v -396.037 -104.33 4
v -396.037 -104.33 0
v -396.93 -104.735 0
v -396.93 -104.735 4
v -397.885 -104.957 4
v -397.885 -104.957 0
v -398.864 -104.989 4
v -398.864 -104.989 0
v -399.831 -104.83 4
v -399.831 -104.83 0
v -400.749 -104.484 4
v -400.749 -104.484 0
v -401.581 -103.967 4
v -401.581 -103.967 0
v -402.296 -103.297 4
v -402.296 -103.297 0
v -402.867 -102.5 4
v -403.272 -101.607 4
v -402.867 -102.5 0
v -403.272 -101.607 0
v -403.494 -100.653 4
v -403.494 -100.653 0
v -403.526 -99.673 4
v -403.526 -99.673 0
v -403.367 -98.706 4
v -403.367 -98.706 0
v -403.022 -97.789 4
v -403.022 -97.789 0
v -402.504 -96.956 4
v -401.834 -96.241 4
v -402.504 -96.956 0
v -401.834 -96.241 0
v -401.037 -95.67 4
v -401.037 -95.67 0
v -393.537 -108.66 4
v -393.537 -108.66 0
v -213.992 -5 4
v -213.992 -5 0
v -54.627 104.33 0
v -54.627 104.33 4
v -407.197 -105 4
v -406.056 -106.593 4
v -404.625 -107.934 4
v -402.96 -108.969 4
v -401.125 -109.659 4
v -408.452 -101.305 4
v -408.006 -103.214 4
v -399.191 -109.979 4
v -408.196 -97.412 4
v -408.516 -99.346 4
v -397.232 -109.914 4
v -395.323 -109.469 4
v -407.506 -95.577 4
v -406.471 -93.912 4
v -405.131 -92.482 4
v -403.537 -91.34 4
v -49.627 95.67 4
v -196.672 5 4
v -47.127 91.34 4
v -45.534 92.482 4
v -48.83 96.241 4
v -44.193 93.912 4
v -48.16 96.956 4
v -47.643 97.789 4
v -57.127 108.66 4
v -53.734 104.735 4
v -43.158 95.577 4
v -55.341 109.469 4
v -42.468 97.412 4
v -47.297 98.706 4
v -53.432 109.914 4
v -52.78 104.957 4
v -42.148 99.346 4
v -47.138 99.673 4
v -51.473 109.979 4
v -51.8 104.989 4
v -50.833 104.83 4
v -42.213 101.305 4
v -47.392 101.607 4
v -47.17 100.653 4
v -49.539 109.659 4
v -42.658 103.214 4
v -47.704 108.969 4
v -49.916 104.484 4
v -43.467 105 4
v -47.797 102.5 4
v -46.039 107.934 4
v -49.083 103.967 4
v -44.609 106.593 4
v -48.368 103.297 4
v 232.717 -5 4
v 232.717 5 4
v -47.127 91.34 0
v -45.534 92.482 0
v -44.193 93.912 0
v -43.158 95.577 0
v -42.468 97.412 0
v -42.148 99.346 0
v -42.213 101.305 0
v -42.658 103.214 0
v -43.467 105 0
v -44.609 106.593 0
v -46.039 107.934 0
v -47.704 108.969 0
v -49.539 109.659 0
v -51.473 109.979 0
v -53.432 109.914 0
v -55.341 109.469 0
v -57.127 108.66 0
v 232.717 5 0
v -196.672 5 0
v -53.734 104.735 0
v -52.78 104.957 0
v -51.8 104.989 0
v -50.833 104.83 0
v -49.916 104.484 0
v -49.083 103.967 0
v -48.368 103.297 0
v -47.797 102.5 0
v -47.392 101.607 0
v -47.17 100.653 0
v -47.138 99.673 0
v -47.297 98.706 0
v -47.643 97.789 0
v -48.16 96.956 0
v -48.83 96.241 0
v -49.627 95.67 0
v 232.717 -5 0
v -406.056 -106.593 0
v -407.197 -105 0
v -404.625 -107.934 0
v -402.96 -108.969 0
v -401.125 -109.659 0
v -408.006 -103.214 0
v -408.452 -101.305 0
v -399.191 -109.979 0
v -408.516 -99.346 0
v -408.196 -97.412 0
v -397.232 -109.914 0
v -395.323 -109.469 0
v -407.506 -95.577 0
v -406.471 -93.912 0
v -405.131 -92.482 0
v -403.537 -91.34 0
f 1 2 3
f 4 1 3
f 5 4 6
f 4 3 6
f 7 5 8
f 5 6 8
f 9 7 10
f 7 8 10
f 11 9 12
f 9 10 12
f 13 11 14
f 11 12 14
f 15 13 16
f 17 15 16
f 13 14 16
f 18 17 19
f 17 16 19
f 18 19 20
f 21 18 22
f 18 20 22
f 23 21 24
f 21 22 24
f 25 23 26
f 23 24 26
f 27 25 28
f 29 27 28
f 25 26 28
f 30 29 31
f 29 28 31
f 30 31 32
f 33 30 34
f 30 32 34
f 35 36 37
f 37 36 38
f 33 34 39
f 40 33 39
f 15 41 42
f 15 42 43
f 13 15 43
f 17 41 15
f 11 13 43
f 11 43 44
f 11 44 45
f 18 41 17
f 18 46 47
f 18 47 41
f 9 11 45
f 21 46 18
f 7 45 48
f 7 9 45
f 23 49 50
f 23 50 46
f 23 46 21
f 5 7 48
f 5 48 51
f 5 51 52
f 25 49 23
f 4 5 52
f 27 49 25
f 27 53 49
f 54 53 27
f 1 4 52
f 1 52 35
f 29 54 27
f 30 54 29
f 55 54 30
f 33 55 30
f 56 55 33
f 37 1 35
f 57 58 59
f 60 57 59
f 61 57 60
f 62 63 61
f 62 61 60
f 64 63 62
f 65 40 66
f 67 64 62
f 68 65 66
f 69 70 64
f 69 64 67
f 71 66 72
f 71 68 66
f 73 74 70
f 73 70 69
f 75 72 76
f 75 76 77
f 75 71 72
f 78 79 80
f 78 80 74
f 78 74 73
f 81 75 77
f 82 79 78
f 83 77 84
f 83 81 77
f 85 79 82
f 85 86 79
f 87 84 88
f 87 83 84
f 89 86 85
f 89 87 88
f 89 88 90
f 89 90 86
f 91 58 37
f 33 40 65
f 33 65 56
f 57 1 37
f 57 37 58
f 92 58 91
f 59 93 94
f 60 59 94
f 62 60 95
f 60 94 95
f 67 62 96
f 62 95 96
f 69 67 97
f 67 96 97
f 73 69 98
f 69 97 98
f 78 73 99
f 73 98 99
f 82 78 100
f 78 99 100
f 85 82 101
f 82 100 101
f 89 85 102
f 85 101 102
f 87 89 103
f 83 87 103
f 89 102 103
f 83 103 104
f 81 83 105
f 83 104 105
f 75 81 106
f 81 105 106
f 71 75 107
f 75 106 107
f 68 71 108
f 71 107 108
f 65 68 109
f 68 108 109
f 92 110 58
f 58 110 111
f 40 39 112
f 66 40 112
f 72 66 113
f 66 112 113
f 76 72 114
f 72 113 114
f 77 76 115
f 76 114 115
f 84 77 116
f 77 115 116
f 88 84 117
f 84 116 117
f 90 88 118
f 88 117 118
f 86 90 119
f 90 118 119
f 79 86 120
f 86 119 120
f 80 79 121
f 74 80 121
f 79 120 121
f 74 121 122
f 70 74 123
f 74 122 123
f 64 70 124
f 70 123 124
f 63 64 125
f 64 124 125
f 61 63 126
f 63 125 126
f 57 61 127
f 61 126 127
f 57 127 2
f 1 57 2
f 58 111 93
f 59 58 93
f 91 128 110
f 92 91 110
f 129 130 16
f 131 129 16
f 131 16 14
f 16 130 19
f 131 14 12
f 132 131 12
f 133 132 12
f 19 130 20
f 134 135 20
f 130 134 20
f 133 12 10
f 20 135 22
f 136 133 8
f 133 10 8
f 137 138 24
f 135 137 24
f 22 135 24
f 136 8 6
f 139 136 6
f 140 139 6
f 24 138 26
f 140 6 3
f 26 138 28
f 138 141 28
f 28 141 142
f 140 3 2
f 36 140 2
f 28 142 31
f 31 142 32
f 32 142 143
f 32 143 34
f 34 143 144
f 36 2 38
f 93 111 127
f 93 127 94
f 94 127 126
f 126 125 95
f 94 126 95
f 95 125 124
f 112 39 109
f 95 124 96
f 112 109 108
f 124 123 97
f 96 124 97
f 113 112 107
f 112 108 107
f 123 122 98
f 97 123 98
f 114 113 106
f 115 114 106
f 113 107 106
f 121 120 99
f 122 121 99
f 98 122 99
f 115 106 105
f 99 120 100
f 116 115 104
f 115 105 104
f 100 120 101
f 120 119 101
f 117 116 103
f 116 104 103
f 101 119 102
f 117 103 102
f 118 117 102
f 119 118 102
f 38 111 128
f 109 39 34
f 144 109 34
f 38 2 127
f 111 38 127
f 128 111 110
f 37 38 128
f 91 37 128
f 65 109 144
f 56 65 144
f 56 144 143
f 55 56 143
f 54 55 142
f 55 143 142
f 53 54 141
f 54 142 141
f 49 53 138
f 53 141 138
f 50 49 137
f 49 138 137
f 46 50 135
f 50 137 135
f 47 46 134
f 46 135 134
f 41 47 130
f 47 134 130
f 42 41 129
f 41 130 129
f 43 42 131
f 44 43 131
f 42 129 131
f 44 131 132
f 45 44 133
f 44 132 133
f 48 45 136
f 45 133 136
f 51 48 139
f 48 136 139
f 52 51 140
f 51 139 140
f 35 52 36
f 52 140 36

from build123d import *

# Parameters (mm, degrees)
EXTRUDE_1_DEPTH = 4


with BuildPart() as part:
    # 草图1 → 凸台-拉伸1 (new body)
    with BuildSketch(Plane.XY):
        with BuildLine():
            Line((-196.671823256, 5), (-47.126996537, 91.339745962))
            ThreePointArc((-47.126996537, 91.339745962), (-43.466742499, 105), (-57.126996537, 108.660254038))
            Line((-57.126996537, 108.660254038), (-403.537158051, -91.339745962))
            ThreePointArc((-403.537158051, -91.339745962), (-407.197412089, -105), (-393.537158051, -108.660254038))
            Line((-393.537158051, -108.660254038), (-213.992331332, -5))
            Line((-213.992331332, -5), (84.039471365, -5))
            Line((84.039471365, -5), (162.432840625, -5))
            Line((162.432840625, -5), (232.716639262, -5))
            Line((232.716639262, -5), (232.716639262, 5))
            Line((232.716639262, 5), (162.432840625, 5))
            Line((162.432840625, 5), (84.039471365, 5))
            Line((84.039471365, 5), (-196.671823256, 5))
        make_face()
        with BuildLine():
            Line((-401.037158051, -95.669872981), (-54.626996537, 104.330127019))
            ThreePointArc((-54.626996537, 104.330127019), (-47.796869518, 102.5), (-49.626996537, 95.669872981))
            Line((-49.626996537, 95.669872981), (-396.037158051, -104.330127019))
            ThreePointArc((-396.037158051, -104.330127019), (-402.86728507, -102.5), (-401.037158051, -95.669872981))
        make_face(mode=Mode.SUBTRACT)
    extrude(amount=EXTRUDE_1_DEPTH)


solid = part.part
